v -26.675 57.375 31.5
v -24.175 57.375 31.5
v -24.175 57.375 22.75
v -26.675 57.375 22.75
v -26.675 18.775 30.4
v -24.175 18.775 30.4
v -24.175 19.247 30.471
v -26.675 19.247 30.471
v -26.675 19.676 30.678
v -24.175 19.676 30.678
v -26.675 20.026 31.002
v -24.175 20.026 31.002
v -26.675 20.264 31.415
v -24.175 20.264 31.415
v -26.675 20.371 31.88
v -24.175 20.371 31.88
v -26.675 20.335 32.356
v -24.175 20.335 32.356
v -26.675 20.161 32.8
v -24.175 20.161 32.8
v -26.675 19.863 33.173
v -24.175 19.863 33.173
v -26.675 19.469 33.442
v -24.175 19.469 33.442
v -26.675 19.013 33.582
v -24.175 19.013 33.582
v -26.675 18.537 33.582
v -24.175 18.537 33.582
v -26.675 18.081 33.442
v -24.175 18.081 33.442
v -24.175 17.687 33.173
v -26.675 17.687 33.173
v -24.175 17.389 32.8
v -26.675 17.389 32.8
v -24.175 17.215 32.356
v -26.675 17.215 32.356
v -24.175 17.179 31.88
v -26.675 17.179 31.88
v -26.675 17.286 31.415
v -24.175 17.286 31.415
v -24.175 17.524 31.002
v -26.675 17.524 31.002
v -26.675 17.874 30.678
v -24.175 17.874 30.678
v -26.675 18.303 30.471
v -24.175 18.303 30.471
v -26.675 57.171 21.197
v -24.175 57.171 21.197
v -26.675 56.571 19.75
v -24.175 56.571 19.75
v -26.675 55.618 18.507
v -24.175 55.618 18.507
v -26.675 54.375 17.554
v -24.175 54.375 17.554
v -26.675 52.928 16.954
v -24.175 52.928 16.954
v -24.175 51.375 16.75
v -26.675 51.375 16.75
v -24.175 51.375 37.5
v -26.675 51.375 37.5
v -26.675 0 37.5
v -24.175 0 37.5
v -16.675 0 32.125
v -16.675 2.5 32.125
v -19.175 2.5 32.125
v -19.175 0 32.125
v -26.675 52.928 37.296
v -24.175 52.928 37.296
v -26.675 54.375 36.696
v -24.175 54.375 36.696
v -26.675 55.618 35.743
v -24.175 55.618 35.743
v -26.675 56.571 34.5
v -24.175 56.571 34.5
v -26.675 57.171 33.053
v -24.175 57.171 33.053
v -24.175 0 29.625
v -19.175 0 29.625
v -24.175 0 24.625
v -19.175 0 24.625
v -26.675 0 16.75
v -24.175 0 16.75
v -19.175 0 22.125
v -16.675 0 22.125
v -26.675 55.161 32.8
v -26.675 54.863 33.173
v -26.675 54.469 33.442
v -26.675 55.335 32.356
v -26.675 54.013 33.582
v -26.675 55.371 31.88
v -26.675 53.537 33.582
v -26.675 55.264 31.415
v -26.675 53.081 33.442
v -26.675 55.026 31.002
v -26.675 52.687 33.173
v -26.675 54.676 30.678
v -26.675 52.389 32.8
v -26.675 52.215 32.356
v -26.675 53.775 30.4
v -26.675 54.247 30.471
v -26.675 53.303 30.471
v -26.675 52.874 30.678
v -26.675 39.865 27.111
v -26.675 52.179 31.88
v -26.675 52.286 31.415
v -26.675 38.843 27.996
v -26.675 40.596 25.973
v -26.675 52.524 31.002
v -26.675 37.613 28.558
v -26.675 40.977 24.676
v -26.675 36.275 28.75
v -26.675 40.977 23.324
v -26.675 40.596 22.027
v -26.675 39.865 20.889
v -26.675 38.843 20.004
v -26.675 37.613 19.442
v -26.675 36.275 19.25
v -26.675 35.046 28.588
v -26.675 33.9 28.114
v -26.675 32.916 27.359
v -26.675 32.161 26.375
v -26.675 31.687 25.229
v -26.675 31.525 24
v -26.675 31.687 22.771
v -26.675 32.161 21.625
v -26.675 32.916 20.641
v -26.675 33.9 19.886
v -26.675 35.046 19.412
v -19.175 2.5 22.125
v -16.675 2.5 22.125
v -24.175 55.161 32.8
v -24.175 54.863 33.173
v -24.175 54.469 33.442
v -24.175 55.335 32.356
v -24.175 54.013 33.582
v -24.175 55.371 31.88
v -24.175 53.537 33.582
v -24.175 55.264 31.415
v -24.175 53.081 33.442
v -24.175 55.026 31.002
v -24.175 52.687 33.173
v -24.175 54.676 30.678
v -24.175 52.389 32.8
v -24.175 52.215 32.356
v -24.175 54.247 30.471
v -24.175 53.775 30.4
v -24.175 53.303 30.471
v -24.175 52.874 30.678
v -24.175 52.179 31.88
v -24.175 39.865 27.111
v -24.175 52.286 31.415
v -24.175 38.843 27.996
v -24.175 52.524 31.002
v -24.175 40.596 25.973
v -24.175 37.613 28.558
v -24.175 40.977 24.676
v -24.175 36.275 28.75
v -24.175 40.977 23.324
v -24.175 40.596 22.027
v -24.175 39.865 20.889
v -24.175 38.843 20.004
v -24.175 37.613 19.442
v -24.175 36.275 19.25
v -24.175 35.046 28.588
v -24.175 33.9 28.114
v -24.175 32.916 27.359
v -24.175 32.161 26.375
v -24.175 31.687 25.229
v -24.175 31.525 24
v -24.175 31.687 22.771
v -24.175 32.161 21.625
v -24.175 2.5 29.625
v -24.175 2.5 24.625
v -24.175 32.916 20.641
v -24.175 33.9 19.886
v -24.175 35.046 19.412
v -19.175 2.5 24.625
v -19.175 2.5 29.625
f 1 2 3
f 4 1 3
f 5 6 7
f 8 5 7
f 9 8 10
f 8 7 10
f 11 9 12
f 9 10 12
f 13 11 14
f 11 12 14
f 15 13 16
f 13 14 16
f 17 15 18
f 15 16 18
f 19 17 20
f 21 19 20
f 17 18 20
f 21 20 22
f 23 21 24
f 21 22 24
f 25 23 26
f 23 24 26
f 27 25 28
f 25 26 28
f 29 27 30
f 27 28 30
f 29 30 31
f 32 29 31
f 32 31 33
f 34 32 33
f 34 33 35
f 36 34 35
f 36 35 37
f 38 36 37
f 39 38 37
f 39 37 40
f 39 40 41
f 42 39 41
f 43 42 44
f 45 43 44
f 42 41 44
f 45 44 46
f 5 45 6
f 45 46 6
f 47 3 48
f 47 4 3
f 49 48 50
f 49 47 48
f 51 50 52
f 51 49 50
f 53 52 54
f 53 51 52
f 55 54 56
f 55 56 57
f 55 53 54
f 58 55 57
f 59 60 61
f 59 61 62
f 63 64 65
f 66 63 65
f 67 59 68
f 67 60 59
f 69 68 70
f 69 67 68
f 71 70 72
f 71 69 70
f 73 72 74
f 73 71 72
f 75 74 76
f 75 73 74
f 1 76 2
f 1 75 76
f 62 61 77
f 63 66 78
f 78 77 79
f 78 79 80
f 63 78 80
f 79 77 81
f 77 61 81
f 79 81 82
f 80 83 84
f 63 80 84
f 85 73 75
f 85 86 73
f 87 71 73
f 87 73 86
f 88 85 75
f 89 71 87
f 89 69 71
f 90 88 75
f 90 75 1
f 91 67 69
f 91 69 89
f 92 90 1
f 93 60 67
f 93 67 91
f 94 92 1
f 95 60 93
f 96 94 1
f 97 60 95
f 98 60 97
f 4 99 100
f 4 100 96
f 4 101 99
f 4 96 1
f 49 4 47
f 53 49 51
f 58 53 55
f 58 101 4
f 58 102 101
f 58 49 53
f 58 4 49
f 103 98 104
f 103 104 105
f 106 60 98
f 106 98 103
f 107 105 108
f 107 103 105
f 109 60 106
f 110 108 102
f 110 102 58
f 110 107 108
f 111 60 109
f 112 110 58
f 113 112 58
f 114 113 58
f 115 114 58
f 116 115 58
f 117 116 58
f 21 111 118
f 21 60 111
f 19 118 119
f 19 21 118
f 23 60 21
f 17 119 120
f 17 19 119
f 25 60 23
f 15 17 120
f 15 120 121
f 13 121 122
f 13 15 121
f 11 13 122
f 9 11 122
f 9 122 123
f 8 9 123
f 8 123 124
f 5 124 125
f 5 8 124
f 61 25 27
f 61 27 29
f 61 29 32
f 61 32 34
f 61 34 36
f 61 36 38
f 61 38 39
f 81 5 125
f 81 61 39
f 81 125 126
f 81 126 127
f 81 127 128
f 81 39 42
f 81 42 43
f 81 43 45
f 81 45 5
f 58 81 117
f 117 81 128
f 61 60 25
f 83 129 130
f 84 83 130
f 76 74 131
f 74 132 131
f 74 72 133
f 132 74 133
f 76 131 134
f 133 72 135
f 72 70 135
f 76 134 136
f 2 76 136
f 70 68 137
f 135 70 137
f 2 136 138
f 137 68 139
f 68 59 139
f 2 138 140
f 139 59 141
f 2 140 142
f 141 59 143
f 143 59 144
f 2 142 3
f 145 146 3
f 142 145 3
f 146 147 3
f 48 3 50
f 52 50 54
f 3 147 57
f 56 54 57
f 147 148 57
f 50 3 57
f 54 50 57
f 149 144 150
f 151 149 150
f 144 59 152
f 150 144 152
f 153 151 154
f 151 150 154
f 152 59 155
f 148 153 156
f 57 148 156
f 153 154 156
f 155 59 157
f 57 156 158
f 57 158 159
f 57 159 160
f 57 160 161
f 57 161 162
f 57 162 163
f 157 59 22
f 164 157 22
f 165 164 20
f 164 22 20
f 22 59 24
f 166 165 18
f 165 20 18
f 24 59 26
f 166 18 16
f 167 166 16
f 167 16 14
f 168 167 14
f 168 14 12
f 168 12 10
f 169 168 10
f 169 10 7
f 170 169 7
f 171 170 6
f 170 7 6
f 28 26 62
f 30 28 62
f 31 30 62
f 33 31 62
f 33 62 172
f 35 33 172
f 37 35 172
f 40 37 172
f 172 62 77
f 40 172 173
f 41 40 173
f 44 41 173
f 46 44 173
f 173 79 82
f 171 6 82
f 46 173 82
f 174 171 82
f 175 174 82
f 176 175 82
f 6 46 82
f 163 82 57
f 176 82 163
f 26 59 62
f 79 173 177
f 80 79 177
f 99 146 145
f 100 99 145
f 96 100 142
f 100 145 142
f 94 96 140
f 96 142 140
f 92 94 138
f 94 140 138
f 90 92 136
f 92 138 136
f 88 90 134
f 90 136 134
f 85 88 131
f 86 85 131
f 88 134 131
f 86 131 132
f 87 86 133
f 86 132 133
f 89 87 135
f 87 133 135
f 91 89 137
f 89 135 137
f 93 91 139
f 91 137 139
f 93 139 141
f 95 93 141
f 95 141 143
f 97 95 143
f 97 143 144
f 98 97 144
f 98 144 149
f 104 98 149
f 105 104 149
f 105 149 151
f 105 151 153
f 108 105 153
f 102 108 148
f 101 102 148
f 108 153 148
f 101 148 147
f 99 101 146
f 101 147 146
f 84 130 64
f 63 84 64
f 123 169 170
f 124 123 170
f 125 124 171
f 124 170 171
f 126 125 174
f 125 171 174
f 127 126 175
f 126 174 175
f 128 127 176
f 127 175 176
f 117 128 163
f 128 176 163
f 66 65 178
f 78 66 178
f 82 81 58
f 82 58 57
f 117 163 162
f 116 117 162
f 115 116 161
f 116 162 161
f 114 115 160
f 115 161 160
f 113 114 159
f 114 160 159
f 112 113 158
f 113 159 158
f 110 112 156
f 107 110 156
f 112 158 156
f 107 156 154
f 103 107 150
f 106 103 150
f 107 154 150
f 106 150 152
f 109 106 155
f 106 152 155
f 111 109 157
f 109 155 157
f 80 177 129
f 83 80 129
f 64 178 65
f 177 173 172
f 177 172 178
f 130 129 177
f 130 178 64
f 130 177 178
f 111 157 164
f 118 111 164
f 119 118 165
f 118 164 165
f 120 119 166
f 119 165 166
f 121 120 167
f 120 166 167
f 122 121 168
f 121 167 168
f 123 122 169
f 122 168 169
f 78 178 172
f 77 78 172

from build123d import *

# Parameters (mm, degrees)
SKETCH1_W               = 80
SKETCH1_H               = 60
BOSS_EXTRUDE1_DEPTH     = 2.5
CUT_EXTRUDE4_DEPTH      = 51.062460986
CUT_EXTRUDE4_DEPTH_BACK = 51.062460986
SKETCH2_R               = 1.6
SKETCH3_W               = 2.5
SKETCH3_H               = 20.5
BOSS_EXTRUDE2_DEPTH     = 66.5
SKETCH4_W               = 80
SKETCH4_H               = 5.5
BOSS_EXTRUDE3_DEPTH     = 2.5
SKETCH5_W               = 2.5
SKETCH5_H               = 5.5
BOSS_EXTRUDE4_DEPTH     = 66.5
SKETCH6_W               = 2.5
SKETCH6_H               = 5.5
CUT_EXTRUDE5_DEPTH      = 66.5
SKETCH9_W               = 2.5
SKETCH9_H               = 2.5
BOSS_EXTRUDE5_DEPTH     = 66.5
SKETCH11_R              = 4.75
CUT_EXTRUDE6_DEPTH      = 2.5
SKETCH15_W              = 2.5
SKETCH15_H              = 23
BOSS_EXTRUDE6_DEPTH     = 8
SKETCH17_W              = 2.5
SKETCH17_H              = 74.5
BOSS_EXTRUDE7_DEPTH     = 2
SKETCH18_R              = 1.6
CUT_EXTRUDE7_DEPTH      = 2.5
SKETCH21_W              = 80
SKETCH21_H              = 2.5
BOSS_EXTRUDE8_DEPTH     = 2
SKETCH22_W              = 4.25
SKETCH22_H              = 74.5
CUT_EXTRUDE8_DEPTH      = 2.5
FILLET1_R               = 5
SKETCH23_W              = 15.225
SKETCH23_H              = 67.5
BOSS_EXTRUDE10_DEPTH    = 2.5
SKETCH24_W              = 95.225
SKETCH24_H              = 10
CUT_EXTRUDE9_DEPTH      = 101.031498164
SKETCH26_W              = 2.5
SKETCH26_H              = 20.75
BOSS_EXTRUDE11_DEPTH    = 74.5
SKETCH27_R              = 1.6
CUT_EXTRUDE10_DEPTH     = 2.5
SKETCH28_W              = 2.5
SKETCH28_H              = 20.75
CUT_EXTRUDE11_DEPTH     = 74.5
SKETCH29_W              = 20.75
SKETCH29_H              = 19.625
CUT_EXTRUDE12_DEPTH     = 2.5
FILLET2_R               = 6
SKETCH31_W              = 13.325
SKETCH31_H              = 57.5
CUT_EXTRUDE13_DEPTH     = 2.5
SKETCH33_W              = 3
SKETCH33_H              = 57.5
CUT_EXTRUDE14_DEPTH     = 2.5
CUT_EXTRUDE15_DEPTH     = 2.5


with BuildPart() as part:
    # Sketch1 → Boss-Extrude1 (new body)
    with BuildSketch(Plane(origin=(0, 0, 0), x_dir=(1, 0, 0), z_dir=(0, 1, 0))):
        Rectangle(SKETCH1_W, SKETCH1_H)
    extrude(amount=BOSS_EXTRUDE1_DEPTH)

    # Sketch2 → Cut-Extrude4 (cut, two sides: drawn at the far end of the back side and taken through both)
    with BuildSketch(Plane(origin=(0, 0, 0), x_dir=(1, 0, 0), z_dir=(0, 1, 0)).offset(-CUT_EXTRUDE4_DEPTH_BACK)):
        with BuildLine():
            Line((-6.25, -24), (-2.5, -24))
            ThreePointArc((-2.5, -24), (0, -21.5), (2.5, -24))
            Line((2.5, -24), (16.25, -24))
            Line((16.25, -24), (16.25, -18))
            Line((16.25, -18), (-6.25, -18))
            Line((-6.25, -18), (-6.25, -24))
        make_face()
        with BuildLine():
            Line((0, -26.5), (0, -30))
            Line((0, -30), (16.25, -30))
            Line((16.25, -30), (16.25, -24))
            Line((16.25, -24), (2.5, -24))
            ThreePointArc((2.5, -24), (1.767766953, -25.767766953), (0, -26.5))
        make_face()
        with BuildLine():
            ThreePointArc((-2.5, -24), (-1.767766953, -25.767766953), (0, -26.5))
            Line((0, -26.5), (0, -24))
            Line((0, -24), (-2.5, -24))
        make_face()
        with BuildLine():
            Line((0, -24), (0, -26.5))
            ThreePointArc((0, -26.5), (1.767766953, -25.767766953), (2.5, -24))
            Line((2.5, -24), (0, -24))
        make_face()
        with BuildLine():
            Line((-2.5, -24), (0, -24))
            Line((0, -24), (2.5, -24))
            ThreePointArc((2.5, -24), (0, -21.5), (-2.5, -24))
        make_face()
        with BuildLine():
            ThreePointArc((-2.5, -24), (-1.767766953, -25.767766953), (0, -26.5))
            Line((0, -26.5), (0, -24))
            Line((0, -24), (-2.5, -24))
        make_face()
        with BuildLine():
            Line((0, -24), (0, -26.5))
            ThreePointArc((0, -26.5), (1.767766953, -25.767766953), (2.5, -24))
            Line((2.5, -24), (0, -24))
        make_face()
        with BuildLine():
            Line((-6.25, -30), (0, -30))
            Line((0, -30), (0, -26.5))
            ThreePointArc((0, -26.5), (-1.767766953, -25.767766953), (-2.5, -24))
            Line((-2.5, -24), (-6.25, -24))
            Line((-6.25, -24), (-6.25, -30))
        make_face()
        with Locations(Location((-8.625, -24, 0), (0, 0, 270))):
            Circle(SKETCH2_R)
        with Locations(Location((18.625, -24, 0), (0, 0, 270))):
            Circle(SKETCH2_R)
    extrude(amount=CUT_EXTRUDE4_DEPTH + CUT_EXTRUDE4_DEPTH_BACK, mode=Mode.SUBTRACT)

    # Sketch3 → Boss-Extrude2 (add)
    with BuildSketch(Plane(origin=(0, 2.5, 0), x_dir=(1, 0, 0), z_dir=(0, 1, 0))):
        with Locations((-38.75, -19.75)):
            Rectangle(SKETCH3_W, SKETCH3_H)
    extrude(amount=BOSS_EXTRUDE2_DEPTH)

    # Sketch4 → Boss-Extrude3 (add)
    with BuildSketch(Plane(origin=(0, 2.5, 0), x_dir=(1, 0, 0), z_dir=(0, 1, 0))):
        with Locations((0, -32.75)):
            Rectangle(SKETCH4_W, SKETCH4_H)
    extrude(amount=-BOSS_EXTRUDE3_DEPTH)

    # Sketch5 → Boss-Extrude4 (add)
    with BuildSketch(Plane(origin=(0, 2.5, 0), x_dir=(1, 0, 0), z_dir=(0, 1, 0))):
        with Locations((-38.75, -32.75)):
            Rectangle(SKETCH5_W, SKETCH5_H)
    extrude(amount=BOSS_EXTRUDE4_DEPTH)

    # Sketch6 → Cut-Extrude5 (cut)
    with BuildSketch(Plane(origin=(0, 69, 0), x_dir=(1, 0, 0), z_dir=(0, 1, 0))):
        with Locations((-38.75, -12.25)):
            Rectangle(SKETCH6_W, SKETCH6_H)
    extrude(amount=-CUT_EXTRUDE5_DEPTH, mode=Mode.SUBTRACT)

    # Sketch9 → Boss-Extrude5 (add)
    with BuildSketch(Plane(origin=(0, 2.5, 0), x_dir=(1, 0, 0), z_dir=(0, 1, 0))):
        with Locations((-38.75, -13.75)):
            Rectangle(SKETCH9_W, SKETCH9_H)
    extrude(amount=BOSS_EXTRUDE5_DEPTH)

    # Sketch11 → Cut-Extrude6 (cut)
    with BuildSketch(Plane(origin=(-37.5, 0, 0), x_dir=(0, 0, -1), z_dir=(1, 0, 0))):
        with Locations((-24, 54)):
            Circle(SKETCH11_R)
    extrude(amount=-CUT_EXTRUDE6_DEPTH, mode=Mode.SUBTRACT)

    # Sketch15 → Boss-Extrude6 (add)
    with BuildSketch(Plane(origin=(0, 69, 0), x_dir=(1, 0, 0), z_dir=(0, 1, 0))):
        with Locations((-38.75, -24)):
            Rectangle(SKETCH15_W, SKETCH15_H)
    extrude(amount=BOSS_EXTRUDE6_DEPTH)

    # Sketch17 → Boss-Extrude7 (add)
    with BuildSketch(Plane.XY.offset(35.5)):
        with Locations((-38.75, 39.75)):
            Rectangle(SKETCH17_W, SKETCH17_H)
    extrude(amount=BOSS_EXTRUDE7_DEPTH)

    # Sketch18 → Cut-Extrude7 (cut)
    with BuildSketch(Plane.ZY.offset(40)):
        with Locations((32, 36.5)):
            Circle(SKETCH18_R)
        with Locations((32, 71.5)):
            Circle(SKETCH18_R)
    extrude(amount=-CUT_EXTRUDE7_DEPTH, mode=Mode.SUBTRACT)

    # Sketch21 → Boss-Extrude8 (add)
    with BuildSketch(Plane.XY.offset(35.5)):
        with Locations((0, 1.25)):
            Rectangle(SKETCH21_W, SKETCH21_H)
    extrude(amount=BOSS_EXTRUDE8_DEPTH)

    # Sketch22 → Cut-Extrude8 (cut)
    with BuildSketch(Plane(origin=(-37.5, 0, 0), x_dir=(0, 0, -1), z_dir=(1, 0, 0))):
        with Locations((-14.625, 39.75)):
            Rectangle(SKETCH22_W, SKETCH22_H)
    extrude(amount=-CUT_EXTRUDE8_DEPTH, mode=Mode.SUBTRACT)

    # Fillet1
    fillet1_edges = [part.edges().sort_by_distance(p)[0] for p in [
        (-38.75, 77, 37.5),
        (-38.75, 77, 16.75),
    ]]
    fillet(fillet1_edges, radius=FILLET1_R)

    # Sketch23 → Boss-Extrude10 (add)
    with BuildSketch(Plane(origin=(0, 2.5, 0), x_dir=(1, 0, 0), z_dir=(0, 1, 0))):
        with Locations((47.6125, -3.75)):
            Rectangle(SKETCH23_W, SKETCH23_H)
    extrude(amount=-BOSS_EXTRUDE10_DEPTH)

    # Sketch24 → Cut-Extrude9 (cut, through all)
    with BuildSketch(Plane(origin=(0, 2.5, 0), x_dir=(1, 0, 0), z_dir=(0, 1, 0))):
        with Locations((7.6125, 25)):
            Rectangle(SKETCH24_W, SKETCH24_H)
    extrude(amount=-CUT_EXTRUDE9_DEPTH, mode=Mode.SUBTRACT)

    # Sketch26 → Boss-Extrude11 (add)
    with BuildSketch(Plane(origin=(0, 2.5, 0), x_dir=(1, 0, 0), z_dir=(0, 1, 0))):
        with Locations((-25.425, -27.125)):
            Rectangle(SKETCH26_W, SKETCH26_H)
    extrude(amount=BOSS_EXTRUDE11_DEPTH)

    # Sketch27 → Cut-Extrude10 (cut)
    with BuildSketch(Plane(origin=(-24.175, 0, 0), x_dir=(0, 0, -1), z_dir=(1, 0, 0))):
        with BuildLine():
            ThreePointArc((-28.75, 36.275), (-27.358757211, 32.916242789), (-24, 31.525))
            Line((-24, 31.525), (-24, 36.275))
            Line((-24, 36.275), (-28.75, 36.275))
        make_face()
        with BuildLine():
            Line((-24, 36.275), (-24, 31.525))
            ThreePointArc((-24, 31.525), (-20.641242789, 32.916242789), (-19.25, 36.275))
            ThreePointArc((-19.25, 36.275), (-24, 41.025), (-28.75, 36.275))
            Line((-28.75, 36.275), (-24, 36.275))
        make_face()
        with BuildLine():
            ThreePointArc((-28.75, 36.275), (-27.358757211, 32.916242789), (-24, 31.525))
            Line((-24, 31.525), (-24, 36.275))
            Line((-24, 36.275), (-28.75, 36.275))
        make_face()
        with BuildLine():
            Line((-24, 36.275), (-24, 31.525))
            ThreePointArc((-24, 31.525), (-20.641242789, 32.916242789), (-19.25, 36.275))
            ThreePointArc((-19.25, 36.275), (-24, 41.025), (-28.75, 36.275))
            Line((-28.75, 36.275), (-24, 36.275))
        make_face()
        with Locations((-32, 18.775)):
            Circle(SKETCH27_R)
        with Locations((-32, 53.775)):
            Circle(SKETCH27_R)
    extrude(amount=-CUT_EXTRUDE10_DEPTH, mode=Mode.SUBTRACT)

    # Sketch28 → Cut-Extrude11 (cut)
    with BuildSketch(Plane(origin=(0, 77, 0), x_dir=(1, 0, 0), z_dir=(0, 1, 0))):
        with Locations((-38.75, -27.125)):
            Rectangle(SKETCH28_W, SKETCH28_H)
    extrude(amount=-CUT_EXTRUDE11_DEPTH, mode=Mode.SUBTRACT)

    # Sketch29 → Cut-Extrude12 (cut)
    with BuildSketch(Plane(origin=(-24.175, 0, 0), x_dir=(0, 0, -1), z_dir=(1, 0, 0))):
        with Locations((-27.125, 67.1875)):
            Rectangle(SKETCH29_W, SKETCH29_H)
    extrude(amount=-CUT_EXTRUDE12_DEPTH, mode=Mode.SUBTRACT)

    # Fillet2
    fillet2_edges = [part.edges().sort_by_distance(p)[0] for p in [
        (-25.425, 57.375, 37.5),
        (-25.425, 57.375, 16.75),
    ]]
    fillet(fillet2_edges, radius=FILLET2_R)

    # Sketch31 → Cut-Extrude13 (cut)
    with BuildSketch(Plane(origin=(0, 2.5, 0), x_dir=(1, 0, 0), z_dir=(0, 1, 0))):
        with Locations((-33.3375, -8.75)):
            Rectangle(SKETCH31_W, SKETCH31_H)
    extrude(amount=-CUT_EXTRUDE13_DEPTH, mode=Mode.SUBTRACT)

    # Sketch33 → Cut-Extrude14 (cut)
    with BuildSketch(Plane(origin=(0, 2.5, 0), x_dir=(1, 0, 0), z_dir=(0, 1, 0))):
        with Locations((53.725, -8.75)):
            Rectangle(SKETCH33_W, SKETCH33_H)
    extrude(amount=-CUT_EXTRUDE14_DEPTH, mode=Mode.SUBTRACT)

    # Sketch34 → Cut-Extrude15 (cut)
    with BuildSketch(Plane(origin=(0, 2.5, 0), x_dir=(1, 0, 0), z_dir=(0, 1, 0))):
        Polygon((-24.175, -16.75), (-24.175, -24.625), (-19.175, -24.625), (-19.175, -22.125), (-16.675, -22.125), (-16.675, -32.125), (-19.175, -32.125), (-19.175, -29.625), (-24.175, -29.625), (-24.175, -37.5), (52.225, -37.5), (52.225, 20), (-26.675, 20), (-26.675, -16.75), align=None)
    extrude(amount=-CUT_EXTRUDE15_DEPTH, mode=Mode.SUBTRACT)


solid = part.part
